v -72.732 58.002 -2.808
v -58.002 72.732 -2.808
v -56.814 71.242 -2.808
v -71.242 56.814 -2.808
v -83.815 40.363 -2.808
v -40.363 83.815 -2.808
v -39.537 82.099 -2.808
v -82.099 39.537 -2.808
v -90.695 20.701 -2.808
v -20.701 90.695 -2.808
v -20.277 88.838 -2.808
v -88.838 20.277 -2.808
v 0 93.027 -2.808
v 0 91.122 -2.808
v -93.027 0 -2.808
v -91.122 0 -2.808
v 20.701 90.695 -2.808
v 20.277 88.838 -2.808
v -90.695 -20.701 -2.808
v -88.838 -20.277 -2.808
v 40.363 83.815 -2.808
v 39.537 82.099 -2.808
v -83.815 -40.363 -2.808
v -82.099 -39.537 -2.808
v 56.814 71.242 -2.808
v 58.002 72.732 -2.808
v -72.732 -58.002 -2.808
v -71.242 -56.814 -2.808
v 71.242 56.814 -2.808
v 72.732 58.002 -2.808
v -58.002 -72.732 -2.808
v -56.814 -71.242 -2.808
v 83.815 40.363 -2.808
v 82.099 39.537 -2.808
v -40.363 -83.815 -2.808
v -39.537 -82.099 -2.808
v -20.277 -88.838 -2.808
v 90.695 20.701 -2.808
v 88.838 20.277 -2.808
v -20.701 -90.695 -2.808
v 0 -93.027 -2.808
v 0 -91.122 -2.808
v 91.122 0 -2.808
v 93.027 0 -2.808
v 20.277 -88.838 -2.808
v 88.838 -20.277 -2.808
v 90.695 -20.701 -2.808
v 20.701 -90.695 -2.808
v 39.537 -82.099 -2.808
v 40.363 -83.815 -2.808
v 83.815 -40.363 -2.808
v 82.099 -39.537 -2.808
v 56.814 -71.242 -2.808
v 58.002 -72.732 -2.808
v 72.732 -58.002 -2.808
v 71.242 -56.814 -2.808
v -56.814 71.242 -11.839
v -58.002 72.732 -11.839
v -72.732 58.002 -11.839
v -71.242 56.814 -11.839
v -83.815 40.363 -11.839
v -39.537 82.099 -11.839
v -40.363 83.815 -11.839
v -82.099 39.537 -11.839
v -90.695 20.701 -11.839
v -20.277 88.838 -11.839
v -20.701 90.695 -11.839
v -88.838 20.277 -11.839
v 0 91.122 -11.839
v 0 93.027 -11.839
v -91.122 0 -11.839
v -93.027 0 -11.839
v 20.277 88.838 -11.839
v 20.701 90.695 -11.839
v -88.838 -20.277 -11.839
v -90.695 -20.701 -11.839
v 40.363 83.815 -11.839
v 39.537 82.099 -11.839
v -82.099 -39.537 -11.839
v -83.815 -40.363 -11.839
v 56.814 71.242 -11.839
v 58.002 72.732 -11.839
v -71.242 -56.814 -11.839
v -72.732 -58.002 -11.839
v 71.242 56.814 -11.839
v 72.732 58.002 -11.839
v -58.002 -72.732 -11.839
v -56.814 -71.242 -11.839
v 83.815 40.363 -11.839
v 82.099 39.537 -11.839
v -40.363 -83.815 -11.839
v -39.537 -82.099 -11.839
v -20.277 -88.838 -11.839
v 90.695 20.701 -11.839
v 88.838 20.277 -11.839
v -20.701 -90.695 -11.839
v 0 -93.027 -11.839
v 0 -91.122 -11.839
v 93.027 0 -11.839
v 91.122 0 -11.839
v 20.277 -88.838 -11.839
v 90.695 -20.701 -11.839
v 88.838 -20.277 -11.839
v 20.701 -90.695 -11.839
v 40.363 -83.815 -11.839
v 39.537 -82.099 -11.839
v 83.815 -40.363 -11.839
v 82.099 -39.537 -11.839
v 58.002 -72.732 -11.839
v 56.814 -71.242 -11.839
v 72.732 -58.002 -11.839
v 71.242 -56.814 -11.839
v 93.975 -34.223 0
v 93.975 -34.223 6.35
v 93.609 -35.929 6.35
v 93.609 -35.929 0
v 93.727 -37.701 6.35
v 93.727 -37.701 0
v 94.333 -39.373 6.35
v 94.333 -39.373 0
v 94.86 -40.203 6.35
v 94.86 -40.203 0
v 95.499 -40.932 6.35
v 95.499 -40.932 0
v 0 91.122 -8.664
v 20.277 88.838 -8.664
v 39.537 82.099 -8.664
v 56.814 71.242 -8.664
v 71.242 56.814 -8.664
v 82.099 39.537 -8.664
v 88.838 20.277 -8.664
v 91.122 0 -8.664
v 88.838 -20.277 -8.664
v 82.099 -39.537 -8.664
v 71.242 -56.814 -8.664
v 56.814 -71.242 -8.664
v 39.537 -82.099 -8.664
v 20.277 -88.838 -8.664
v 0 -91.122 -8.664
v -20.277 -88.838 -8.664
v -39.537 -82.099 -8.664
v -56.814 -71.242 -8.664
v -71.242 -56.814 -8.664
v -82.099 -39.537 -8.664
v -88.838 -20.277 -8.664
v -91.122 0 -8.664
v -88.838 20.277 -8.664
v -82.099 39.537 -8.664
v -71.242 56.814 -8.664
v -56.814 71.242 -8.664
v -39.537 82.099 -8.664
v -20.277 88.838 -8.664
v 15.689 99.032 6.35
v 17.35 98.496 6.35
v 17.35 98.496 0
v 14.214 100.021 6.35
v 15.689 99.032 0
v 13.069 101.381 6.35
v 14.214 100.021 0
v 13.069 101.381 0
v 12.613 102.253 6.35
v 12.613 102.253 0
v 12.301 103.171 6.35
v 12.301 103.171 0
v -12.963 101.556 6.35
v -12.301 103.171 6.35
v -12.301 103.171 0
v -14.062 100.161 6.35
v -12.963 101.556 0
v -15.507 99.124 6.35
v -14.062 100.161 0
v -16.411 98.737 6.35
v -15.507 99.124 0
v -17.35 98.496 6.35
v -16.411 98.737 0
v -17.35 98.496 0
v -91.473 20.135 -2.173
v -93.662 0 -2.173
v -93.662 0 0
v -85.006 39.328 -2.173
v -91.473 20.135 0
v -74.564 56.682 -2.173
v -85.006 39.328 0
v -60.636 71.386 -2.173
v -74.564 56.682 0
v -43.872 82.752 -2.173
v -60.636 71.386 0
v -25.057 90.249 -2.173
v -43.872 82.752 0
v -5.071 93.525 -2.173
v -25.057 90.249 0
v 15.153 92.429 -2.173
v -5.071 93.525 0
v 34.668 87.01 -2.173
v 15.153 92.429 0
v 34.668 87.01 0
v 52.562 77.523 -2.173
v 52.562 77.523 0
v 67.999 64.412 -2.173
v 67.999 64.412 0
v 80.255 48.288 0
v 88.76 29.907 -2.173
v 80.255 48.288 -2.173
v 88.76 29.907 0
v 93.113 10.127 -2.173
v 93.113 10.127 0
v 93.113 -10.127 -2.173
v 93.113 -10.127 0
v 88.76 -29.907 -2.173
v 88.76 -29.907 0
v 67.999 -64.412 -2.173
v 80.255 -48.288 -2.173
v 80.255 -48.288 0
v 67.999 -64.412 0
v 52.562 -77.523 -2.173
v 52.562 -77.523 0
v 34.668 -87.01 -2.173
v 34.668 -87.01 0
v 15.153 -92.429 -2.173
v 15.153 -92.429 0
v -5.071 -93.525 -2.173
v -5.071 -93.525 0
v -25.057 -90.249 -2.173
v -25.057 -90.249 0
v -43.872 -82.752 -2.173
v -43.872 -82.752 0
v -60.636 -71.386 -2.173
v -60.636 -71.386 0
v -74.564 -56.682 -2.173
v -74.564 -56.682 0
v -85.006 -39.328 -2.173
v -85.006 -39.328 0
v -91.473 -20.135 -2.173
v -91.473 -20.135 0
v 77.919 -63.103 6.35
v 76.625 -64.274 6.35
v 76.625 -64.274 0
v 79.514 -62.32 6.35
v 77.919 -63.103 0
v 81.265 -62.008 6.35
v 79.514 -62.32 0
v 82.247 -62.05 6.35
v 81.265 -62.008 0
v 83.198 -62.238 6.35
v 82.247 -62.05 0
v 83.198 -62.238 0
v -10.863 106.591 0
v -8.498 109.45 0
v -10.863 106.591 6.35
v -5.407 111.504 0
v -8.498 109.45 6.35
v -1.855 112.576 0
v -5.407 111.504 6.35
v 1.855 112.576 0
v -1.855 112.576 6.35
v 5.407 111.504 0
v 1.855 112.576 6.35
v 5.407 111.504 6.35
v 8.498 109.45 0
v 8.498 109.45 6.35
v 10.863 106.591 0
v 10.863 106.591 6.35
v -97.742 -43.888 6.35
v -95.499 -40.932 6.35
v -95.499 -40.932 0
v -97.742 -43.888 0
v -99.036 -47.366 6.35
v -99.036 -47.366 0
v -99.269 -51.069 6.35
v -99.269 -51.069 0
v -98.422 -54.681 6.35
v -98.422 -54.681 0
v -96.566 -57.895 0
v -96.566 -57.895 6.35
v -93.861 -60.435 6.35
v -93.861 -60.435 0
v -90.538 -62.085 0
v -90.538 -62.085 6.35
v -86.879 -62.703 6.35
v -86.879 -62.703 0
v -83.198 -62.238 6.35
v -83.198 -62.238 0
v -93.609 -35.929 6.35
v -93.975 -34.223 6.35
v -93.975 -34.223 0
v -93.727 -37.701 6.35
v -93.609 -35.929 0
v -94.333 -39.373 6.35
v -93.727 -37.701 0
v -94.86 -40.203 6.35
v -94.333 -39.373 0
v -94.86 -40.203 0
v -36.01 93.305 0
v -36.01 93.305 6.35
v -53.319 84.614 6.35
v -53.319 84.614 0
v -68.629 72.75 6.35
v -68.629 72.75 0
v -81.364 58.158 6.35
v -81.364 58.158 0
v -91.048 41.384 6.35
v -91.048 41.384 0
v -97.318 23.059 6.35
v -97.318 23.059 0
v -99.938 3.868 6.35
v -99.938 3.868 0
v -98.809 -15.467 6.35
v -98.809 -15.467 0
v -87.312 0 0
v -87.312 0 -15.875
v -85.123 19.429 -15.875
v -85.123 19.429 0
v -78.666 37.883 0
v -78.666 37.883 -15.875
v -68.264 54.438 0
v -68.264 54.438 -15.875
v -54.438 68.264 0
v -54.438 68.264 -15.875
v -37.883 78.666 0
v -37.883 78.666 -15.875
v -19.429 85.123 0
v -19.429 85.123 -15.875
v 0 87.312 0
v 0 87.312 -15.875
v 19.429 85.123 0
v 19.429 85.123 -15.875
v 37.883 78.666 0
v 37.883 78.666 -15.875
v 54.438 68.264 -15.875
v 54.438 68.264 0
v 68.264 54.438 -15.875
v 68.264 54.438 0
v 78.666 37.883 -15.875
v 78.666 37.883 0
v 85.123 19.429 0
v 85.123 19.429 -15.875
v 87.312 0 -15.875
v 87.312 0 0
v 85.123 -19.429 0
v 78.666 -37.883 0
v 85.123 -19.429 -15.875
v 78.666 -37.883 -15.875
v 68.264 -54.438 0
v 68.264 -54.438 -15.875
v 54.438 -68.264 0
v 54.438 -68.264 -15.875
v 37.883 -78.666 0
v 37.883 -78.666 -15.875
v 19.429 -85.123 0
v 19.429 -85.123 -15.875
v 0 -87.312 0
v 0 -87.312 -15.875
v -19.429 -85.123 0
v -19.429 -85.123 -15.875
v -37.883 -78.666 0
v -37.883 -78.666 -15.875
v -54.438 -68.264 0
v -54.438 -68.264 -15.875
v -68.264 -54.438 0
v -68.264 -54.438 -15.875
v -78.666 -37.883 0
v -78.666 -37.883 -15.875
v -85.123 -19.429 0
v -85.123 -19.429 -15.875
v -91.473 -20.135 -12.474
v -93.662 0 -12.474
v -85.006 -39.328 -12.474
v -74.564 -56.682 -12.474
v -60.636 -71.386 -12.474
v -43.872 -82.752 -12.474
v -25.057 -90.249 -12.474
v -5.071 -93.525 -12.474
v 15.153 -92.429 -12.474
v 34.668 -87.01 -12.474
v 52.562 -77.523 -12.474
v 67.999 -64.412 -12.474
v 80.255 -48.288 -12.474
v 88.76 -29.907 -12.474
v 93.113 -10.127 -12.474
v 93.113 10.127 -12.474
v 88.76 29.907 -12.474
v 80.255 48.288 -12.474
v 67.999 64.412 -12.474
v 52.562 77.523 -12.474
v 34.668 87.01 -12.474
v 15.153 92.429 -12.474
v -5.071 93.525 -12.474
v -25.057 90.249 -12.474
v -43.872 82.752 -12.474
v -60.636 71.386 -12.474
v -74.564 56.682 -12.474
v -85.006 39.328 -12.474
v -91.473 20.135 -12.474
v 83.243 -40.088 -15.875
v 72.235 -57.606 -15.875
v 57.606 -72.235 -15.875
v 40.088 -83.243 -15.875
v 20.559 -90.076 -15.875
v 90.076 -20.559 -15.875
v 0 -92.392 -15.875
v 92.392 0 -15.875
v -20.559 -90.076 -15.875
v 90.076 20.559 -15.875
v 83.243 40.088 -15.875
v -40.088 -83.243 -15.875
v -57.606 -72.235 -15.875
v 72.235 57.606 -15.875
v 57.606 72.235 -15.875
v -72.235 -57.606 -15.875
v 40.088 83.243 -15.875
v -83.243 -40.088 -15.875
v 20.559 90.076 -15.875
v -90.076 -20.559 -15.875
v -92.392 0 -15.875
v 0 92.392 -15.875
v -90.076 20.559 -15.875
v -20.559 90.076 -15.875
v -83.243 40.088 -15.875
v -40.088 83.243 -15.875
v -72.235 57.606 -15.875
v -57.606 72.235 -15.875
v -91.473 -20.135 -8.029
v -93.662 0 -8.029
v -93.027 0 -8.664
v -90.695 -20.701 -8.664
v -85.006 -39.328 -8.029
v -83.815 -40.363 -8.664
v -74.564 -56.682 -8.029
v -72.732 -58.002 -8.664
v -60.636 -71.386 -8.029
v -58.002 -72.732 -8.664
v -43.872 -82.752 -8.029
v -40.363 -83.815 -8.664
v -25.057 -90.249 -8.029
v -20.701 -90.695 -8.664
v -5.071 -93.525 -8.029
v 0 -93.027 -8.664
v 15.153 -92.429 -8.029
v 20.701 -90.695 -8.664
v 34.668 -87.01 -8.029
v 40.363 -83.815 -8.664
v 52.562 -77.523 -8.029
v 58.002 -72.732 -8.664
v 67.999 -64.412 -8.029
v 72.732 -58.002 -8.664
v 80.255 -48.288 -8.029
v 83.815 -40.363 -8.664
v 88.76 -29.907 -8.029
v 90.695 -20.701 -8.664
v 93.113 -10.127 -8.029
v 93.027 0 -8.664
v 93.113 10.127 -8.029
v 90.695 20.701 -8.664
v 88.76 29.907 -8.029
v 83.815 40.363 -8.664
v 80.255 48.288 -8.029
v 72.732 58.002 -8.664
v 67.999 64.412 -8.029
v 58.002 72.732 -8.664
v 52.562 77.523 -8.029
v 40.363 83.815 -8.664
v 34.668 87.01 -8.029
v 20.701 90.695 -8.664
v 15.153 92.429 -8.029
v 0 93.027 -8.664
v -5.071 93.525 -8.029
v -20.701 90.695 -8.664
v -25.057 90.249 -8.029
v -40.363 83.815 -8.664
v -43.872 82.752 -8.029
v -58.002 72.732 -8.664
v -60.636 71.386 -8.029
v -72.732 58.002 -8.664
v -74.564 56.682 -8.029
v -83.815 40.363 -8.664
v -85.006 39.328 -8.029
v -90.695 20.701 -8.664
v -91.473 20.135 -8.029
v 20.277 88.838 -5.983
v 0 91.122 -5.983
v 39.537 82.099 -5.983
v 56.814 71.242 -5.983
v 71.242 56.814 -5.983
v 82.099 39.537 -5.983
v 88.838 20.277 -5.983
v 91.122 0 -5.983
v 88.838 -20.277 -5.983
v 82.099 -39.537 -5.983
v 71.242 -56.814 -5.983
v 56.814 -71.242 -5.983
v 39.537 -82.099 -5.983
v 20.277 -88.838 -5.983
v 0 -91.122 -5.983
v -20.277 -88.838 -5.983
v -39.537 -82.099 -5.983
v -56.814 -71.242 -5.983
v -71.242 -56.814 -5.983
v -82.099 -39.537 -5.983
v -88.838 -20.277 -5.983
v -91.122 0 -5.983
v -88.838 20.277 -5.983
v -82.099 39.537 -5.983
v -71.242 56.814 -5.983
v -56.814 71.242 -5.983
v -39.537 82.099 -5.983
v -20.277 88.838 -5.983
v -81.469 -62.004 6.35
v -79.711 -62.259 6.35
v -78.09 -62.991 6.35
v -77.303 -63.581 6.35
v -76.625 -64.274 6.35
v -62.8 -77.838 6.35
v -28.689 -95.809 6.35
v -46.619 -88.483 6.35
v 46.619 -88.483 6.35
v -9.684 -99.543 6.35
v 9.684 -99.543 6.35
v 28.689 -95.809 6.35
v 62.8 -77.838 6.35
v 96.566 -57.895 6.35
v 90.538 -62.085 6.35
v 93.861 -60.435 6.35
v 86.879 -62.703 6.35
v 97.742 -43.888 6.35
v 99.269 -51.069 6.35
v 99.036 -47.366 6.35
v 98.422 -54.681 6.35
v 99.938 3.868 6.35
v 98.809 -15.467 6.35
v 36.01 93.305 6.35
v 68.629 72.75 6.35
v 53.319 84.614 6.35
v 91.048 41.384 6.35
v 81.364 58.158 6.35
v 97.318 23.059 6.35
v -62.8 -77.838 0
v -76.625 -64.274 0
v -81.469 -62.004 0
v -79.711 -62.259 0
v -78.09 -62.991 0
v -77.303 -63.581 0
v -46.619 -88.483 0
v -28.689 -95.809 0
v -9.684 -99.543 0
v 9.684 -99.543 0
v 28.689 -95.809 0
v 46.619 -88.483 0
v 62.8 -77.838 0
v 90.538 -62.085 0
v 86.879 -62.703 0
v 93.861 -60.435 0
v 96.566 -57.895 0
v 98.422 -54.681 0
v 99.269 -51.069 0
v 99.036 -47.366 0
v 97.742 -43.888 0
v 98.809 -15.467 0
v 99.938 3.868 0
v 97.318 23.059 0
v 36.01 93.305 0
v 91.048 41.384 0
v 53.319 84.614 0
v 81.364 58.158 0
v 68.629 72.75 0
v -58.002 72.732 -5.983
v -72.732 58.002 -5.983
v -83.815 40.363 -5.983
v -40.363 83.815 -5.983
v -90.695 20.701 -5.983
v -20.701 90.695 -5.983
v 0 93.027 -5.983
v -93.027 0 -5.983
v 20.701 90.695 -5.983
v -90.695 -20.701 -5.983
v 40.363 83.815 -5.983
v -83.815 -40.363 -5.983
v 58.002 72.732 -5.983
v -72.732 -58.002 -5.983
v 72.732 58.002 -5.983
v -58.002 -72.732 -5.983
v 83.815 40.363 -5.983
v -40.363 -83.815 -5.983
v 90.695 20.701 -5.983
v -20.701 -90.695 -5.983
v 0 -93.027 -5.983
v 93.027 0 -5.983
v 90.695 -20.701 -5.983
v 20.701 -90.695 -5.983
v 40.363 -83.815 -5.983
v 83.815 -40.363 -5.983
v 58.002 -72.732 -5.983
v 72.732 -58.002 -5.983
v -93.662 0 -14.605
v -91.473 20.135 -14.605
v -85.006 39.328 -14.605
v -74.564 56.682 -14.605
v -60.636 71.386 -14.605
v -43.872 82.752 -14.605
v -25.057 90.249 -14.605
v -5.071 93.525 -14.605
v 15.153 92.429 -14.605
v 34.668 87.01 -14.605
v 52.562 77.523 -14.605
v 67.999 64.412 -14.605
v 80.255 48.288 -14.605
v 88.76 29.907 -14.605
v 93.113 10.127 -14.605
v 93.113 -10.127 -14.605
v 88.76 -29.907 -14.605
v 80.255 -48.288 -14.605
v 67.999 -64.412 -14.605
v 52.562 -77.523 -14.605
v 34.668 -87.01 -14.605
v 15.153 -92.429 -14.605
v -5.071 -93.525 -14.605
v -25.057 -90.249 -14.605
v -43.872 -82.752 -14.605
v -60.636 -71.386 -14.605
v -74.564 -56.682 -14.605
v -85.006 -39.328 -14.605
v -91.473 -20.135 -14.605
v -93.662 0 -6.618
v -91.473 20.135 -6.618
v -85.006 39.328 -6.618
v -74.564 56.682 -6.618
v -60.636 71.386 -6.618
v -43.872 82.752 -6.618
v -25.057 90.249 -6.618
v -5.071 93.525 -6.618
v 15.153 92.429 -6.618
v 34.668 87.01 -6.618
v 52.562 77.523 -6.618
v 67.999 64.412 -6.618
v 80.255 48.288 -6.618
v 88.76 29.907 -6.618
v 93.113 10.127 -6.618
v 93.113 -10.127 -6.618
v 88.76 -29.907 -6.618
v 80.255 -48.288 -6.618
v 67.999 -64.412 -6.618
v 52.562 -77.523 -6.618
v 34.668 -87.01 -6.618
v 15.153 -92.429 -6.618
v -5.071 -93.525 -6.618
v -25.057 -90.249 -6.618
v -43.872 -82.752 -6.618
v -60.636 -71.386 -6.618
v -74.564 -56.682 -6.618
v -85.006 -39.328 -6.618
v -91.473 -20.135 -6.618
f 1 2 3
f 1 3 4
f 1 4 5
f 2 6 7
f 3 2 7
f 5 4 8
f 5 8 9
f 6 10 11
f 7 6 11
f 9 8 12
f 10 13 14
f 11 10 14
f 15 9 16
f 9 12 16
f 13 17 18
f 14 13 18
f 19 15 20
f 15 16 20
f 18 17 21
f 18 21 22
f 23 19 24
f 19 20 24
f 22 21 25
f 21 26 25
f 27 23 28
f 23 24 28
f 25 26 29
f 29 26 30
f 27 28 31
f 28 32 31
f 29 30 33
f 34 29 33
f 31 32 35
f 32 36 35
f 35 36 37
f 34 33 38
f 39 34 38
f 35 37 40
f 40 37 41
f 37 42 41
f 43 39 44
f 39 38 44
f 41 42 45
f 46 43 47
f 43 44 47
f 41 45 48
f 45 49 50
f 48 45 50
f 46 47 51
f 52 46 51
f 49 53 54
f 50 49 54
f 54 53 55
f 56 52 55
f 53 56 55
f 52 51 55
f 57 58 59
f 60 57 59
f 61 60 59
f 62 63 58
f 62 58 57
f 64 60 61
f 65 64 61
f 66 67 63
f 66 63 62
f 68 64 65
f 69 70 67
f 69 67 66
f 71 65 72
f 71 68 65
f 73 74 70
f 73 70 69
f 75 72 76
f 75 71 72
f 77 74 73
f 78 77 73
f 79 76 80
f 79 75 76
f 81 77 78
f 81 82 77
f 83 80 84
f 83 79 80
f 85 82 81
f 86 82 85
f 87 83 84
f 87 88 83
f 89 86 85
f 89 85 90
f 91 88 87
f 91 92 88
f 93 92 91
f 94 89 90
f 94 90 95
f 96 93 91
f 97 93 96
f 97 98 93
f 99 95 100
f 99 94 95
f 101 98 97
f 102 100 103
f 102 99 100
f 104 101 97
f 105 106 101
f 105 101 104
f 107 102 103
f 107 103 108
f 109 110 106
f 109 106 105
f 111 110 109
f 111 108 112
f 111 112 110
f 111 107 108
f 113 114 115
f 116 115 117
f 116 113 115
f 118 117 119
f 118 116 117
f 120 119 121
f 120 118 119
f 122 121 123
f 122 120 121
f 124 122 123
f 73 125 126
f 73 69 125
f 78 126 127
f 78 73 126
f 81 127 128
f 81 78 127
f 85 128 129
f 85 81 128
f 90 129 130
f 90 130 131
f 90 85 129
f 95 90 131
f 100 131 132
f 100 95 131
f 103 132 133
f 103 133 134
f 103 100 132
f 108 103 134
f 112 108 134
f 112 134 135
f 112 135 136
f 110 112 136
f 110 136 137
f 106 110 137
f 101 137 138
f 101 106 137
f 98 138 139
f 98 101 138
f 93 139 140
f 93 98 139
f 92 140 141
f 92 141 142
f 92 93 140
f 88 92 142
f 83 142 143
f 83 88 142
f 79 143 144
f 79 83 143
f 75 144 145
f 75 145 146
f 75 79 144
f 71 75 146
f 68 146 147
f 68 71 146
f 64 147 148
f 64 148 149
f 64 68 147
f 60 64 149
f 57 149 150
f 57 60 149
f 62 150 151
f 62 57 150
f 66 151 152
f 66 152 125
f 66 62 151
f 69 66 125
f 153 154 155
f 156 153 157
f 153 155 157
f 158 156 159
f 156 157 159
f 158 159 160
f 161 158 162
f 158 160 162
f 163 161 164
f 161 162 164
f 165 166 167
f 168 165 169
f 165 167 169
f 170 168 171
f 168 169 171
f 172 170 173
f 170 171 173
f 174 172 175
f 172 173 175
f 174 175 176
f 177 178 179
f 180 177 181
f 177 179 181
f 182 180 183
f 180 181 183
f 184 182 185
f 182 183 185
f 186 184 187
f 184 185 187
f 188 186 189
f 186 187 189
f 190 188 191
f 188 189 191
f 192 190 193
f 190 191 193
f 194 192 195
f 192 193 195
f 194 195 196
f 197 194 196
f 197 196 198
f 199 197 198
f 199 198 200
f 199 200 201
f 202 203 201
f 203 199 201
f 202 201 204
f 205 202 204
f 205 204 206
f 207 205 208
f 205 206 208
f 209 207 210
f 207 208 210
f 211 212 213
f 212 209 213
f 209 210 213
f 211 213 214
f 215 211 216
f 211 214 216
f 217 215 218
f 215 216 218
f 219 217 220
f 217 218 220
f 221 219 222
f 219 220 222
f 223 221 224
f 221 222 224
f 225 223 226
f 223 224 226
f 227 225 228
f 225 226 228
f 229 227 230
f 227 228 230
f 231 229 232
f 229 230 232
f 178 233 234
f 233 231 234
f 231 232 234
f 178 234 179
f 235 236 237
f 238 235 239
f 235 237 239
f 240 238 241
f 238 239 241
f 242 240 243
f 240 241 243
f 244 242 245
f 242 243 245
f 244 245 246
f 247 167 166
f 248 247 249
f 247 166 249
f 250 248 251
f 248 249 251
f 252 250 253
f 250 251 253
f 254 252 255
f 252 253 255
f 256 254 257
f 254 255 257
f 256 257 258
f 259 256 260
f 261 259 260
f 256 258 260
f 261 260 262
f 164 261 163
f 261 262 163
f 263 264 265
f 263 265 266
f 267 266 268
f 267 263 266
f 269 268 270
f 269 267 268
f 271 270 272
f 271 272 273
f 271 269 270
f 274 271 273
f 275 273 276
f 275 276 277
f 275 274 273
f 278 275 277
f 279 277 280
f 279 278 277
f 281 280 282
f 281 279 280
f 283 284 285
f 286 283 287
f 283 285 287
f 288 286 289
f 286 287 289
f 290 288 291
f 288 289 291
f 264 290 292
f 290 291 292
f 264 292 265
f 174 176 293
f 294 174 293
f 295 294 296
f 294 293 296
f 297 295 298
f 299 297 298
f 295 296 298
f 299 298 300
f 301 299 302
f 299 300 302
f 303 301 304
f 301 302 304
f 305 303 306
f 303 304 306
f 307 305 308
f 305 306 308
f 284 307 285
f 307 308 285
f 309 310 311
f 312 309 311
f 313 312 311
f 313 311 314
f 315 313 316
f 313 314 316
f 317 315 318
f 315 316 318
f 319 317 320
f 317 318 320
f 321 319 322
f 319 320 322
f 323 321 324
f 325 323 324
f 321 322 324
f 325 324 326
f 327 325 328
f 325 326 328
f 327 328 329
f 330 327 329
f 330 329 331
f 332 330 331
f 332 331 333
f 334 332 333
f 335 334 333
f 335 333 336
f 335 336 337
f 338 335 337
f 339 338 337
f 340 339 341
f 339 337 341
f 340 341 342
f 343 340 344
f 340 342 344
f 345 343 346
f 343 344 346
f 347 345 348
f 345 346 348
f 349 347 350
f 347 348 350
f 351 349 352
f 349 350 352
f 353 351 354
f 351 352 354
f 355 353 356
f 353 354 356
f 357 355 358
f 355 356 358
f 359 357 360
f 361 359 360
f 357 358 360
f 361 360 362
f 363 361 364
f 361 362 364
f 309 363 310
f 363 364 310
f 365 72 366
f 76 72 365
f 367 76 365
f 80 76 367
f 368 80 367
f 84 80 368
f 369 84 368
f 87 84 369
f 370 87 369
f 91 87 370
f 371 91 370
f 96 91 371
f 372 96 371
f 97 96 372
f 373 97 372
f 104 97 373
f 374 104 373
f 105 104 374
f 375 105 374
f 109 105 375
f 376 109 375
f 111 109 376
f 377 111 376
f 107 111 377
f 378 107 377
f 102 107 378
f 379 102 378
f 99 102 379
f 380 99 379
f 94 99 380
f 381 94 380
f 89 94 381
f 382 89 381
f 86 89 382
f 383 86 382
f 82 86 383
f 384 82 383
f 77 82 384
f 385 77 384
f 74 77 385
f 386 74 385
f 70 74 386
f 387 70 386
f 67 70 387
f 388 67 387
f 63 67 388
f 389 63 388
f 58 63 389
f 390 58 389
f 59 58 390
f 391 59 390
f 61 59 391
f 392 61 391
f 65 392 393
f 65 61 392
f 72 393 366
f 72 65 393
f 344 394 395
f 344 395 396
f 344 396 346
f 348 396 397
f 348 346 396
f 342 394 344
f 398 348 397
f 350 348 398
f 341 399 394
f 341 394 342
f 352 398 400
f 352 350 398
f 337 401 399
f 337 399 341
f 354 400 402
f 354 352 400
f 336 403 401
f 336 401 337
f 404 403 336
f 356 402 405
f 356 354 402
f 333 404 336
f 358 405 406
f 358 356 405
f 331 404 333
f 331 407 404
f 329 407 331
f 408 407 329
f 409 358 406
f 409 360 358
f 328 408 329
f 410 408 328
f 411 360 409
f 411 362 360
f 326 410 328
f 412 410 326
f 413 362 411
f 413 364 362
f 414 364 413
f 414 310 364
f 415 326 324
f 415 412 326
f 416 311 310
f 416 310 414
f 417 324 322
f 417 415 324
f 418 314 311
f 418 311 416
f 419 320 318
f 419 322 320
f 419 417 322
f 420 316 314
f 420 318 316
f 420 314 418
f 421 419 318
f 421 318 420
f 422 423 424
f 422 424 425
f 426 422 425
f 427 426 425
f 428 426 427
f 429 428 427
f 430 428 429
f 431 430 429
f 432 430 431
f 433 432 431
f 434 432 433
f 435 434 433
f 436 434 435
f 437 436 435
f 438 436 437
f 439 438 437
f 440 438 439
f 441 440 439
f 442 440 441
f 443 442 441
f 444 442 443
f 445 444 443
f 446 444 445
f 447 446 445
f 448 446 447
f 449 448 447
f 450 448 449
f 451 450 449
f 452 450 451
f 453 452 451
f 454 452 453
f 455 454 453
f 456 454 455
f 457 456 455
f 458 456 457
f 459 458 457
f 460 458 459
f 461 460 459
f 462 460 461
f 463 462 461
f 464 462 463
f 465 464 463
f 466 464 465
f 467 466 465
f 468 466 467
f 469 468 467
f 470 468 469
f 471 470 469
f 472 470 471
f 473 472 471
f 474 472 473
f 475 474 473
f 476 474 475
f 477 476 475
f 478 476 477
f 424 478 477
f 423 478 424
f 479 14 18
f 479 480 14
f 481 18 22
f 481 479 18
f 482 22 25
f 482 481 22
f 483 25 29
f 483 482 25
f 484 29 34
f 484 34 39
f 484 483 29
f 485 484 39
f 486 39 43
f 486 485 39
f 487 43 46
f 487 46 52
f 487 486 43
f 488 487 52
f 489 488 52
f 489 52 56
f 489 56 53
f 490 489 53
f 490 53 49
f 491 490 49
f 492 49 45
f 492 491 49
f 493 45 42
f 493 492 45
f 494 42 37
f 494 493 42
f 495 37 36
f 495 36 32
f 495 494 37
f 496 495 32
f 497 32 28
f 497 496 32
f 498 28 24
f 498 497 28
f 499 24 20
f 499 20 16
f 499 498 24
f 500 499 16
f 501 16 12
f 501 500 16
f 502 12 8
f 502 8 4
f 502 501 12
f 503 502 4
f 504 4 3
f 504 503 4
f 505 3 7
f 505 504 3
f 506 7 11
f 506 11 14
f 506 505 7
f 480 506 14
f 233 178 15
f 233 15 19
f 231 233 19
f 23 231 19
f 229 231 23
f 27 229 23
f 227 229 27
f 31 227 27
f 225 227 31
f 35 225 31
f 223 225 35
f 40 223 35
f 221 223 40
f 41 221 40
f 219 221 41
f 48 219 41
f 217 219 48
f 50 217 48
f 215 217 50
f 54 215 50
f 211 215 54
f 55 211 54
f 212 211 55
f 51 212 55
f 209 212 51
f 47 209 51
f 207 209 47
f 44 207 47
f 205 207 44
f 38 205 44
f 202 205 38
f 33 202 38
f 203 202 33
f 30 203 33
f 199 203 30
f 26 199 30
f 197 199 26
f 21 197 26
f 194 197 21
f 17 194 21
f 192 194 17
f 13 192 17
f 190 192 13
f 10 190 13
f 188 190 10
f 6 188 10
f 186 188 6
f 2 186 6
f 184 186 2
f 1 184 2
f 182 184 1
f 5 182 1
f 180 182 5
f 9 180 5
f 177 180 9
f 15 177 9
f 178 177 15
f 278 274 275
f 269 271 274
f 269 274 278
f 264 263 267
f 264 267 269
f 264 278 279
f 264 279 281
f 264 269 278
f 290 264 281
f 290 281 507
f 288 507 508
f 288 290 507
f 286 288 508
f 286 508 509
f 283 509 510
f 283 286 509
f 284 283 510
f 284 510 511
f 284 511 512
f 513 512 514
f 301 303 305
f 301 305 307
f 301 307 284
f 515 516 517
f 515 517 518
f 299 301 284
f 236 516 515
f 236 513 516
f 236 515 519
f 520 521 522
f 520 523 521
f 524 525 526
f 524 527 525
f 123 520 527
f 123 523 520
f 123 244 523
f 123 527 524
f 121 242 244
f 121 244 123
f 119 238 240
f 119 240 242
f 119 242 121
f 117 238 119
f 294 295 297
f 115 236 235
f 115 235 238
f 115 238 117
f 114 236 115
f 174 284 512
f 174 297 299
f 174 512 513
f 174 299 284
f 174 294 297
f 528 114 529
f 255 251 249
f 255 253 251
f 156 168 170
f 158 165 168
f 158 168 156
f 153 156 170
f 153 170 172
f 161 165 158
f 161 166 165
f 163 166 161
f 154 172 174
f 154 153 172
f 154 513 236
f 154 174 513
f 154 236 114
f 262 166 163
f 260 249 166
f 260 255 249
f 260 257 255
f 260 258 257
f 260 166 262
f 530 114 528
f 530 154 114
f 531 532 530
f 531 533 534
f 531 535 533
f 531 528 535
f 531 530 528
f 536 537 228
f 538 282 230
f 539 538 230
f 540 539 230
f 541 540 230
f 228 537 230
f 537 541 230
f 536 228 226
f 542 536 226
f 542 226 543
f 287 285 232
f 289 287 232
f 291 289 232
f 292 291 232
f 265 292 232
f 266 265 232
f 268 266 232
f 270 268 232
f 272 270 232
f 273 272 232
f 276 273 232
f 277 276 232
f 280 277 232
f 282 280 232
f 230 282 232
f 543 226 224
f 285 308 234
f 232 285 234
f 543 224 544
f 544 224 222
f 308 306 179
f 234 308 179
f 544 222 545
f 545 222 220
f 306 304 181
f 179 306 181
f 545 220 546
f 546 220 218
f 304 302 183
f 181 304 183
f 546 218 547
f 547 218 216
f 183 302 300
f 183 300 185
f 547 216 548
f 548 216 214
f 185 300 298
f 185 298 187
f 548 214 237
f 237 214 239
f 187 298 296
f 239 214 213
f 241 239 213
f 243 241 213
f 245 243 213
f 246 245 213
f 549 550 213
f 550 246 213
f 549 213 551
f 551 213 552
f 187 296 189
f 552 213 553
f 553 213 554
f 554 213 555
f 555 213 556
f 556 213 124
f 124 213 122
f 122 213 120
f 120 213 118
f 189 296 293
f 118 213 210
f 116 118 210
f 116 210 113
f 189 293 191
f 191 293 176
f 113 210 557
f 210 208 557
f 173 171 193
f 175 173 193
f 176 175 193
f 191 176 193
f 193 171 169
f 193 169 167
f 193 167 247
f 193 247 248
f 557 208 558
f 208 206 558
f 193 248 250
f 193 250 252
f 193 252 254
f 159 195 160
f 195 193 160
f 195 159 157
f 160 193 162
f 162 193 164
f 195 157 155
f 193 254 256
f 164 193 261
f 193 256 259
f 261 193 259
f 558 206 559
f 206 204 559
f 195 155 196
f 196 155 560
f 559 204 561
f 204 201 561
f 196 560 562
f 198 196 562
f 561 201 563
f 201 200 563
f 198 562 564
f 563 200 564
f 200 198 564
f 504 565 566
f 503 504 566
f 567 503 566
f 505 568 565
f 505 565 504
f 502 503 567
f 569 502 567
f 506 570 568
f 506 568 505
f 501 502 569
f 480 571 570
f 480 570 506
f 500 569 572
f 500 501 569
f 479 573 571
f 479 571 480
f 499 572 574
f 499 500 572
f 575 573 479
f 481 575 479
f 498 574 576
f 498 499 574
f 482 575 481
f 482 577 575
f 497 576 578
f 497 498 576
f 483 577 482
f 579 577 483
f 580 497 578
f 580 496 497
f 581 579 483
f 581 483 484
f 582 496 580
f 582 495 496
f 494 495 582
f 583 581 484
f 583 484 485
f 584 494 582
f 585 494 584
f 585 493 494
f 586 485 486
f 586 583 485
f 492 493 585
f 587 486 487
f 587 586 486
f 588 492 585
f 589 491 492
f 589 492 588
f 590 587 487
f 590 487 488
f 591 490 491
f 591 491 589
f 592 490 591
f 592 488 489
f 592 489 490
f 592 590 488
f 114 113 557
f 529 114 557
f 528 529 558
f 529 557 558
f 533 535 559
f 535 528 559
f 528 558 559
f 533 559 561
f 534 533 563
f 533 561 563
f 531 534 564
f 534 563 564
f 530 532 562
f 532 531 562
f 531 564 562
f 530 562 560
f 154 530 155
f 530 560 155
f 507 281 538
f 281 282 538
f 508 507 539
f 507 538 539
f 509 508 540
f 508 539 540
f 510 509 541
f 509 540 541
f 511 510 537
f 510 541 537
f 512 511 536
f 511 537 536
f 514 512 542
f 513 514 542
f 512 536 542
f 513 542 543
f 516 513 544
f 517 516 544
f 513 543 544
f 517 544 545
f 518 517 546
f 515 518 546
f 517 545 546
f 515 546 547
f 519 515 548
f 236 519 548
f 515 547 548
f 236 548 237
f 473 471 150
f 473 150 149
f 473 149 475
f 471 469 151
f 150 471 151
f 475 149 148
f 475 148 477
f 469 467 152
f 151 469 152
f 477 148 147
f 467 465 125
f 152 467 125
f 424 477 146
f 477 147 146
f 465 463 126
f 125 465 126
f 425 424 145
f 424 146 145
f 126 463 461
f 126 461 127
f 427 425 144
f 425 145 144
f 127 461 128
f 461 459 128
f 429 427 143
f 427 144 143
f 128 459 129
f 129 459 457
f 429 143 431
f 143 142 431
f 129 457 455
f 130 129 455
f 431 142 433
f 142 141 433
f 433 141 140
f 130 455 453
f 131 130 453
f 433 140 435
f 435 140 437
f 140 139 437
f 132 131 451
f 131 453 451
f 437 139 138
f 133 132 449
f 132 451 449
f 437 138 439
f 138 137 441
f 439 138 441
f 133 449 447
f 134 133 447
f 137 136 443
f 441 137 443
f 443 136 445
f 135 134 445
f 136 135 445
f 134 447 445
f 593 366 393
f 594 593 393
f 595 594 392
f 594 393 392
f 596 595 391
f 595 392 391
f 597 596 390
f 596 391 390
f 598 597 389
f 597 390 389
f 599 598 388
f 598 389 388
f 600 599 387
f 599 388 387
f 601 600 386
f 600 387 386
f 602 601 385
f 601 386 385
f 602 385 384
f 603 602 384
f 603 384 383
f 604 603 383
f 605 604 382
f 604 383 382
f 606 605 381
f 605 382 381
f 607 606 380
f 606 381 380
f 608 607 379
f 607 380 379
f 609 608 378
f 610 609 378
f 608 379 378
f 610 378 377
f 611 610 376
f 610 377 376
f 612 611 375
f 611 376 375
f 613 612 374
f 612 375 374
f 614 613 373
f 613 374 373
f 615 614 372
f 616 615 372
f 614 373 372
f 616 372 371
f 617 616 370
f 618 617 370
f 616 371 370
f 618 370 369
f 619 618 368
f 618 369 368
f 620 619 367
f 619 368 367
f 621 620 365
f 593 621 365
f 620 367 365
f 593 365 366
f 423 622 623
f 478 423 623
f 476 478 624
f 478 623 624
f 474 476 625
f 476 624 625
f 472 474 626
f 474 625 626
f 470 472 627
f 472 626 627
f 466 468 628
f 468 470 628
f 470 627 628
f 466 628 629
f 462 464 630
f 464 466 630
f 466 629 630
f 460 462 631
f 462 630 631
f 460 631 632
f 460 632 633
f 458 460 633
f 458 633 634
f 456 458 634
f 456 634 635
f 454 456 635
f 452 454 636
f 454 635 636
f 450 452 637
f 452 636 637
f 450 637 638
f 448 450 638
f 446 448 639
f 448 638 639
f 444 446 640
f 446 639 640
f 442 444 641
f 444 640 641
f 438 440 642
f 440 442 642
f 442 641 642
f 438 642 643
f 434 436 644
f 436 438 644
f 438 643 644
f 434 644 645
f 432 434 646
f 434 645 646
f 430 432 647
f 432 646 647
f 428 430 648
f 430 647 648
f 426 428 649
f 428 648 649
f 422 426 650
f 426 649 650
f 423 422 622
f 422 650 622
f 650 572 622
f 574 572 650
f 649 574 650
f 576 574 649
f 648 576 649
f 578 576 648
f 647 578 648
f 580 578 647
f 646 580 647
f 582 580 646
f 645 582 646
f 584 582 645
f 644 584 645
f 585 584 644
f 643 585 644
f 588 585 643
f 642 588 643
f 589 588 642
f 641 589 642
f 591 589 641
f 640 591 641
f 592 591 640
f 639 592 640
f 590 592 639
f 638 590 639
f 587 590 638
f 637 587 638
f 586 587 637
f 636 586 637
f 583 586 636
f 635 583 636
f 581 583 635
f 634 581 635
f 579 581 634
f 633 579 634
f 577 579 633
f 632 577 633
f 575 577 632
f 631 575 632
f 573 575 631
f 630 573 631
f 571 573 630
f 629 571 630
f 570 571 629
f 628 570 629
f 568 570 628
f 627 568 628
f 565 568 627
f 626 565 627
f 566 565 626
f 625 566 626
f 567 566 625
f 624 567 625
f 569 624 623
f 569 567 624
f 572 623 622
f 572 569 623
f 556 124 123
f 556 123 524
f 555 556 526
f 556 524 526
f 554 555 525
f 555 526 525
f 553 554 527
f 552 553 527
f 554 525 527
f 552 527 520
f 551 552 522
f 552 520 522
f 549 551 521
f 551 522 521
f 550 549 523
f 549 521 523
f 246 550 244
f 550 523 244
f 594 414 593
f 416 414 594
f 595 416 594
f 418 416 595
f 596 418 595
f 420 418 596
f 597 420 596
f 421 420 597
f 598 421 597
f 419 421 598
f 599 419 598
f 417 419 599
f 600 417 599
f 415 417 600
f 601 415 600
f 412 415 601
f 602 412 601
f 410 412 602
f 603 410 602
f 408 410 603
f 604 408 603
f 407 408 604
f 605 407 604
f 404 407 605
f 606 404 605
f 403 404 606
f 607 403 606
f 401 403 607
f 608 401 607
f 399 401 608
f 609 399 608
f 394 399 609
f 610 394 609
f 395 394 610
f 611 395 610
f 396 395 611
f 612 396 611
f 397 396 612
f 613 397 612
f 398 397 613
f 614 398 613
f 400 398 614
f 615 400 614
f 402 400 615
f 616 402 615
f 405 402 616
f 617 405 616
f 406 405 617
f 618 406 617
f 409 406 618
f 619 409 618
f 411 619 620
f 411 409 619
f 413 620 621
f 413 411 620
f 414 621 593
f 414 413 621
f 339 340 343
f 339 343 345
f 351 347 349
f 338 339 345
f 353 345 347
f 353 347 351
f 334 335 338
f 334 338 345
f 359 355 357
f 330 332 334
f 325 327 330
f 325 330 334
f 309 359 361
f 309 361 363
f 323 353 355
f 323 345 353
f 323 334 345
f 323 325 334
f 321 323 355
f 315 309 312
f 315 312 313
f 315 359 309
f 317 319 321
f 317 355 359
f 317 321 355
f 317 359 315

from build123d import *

# Parameters (mm, degrees)
SKETCH1_R          = 100.0125
EXTRUDE1_DEPTH     = 6.35
SKETCH2_R          = 93.6625
EXTRUDE2_DEPTH     = 15.875
SKETCH3_R          = 87.3125
CUT_EXTRUDE1_DEPTH = 15.875
SKETCH4_W          = 3.175
SKETCH4_H          = 2.54
CHAMFER1_SIZE      = 1.27
EXTRUDE3_DEPTH     = 6.35
CHAMFER2_SIZE      = 0.635
FILLET1_R          = 6.35


with BuildPart() as part:
    # Sketch1 → Extrude1 (new body)
    with BuildSketch(Plane.XY):
        Circle(SKETCH1_R)
    extrude(amount=EXTRUDE1_DEPTH)

    # Sketch2 → Extrude2 (add)
    with BuildSketch(Plane(origin=(0, 0, 0), x_dir=(-1, 0, 0), z_dir=(0, 0, -1))):
        Circle(SKETCH2_R)
    extrude(amount=EXTRUDE2_DEPTH)

    # Sketch3 → Cut-Extrude1 (cut)
    with BuildSketch(Plane(origin=(0, 0, -15.875), x_dir=(-1, 0, 0), z_dir=(0, 0, -1))):
        Circle(SKETCH3_R)
    extrude(amount=-CUT_EXTRUDE1_DEPTH, mode=Mode.SUBTRACT)

    # Sketch4 → Cut-Revolve1 (revolve, cut)
    with BuildSketch(Plane(origin=(0, 0, 0), x_dir=(0, 0, -1), z_dir=(1, 0, 0))):
        with Locations((4.395911794, 92.3925)):
            Rectangle(SKETCH4_W, SKETCH4_H)
        with Locations((10.251990741, 92.3925)):
            Rectangle(SKETCH4_W, SKETCH4_H)
    revolve(axis=Axis((0, 0, 0), (0, 0, -1)), mode=Mode.SUBTRACT)

    # Chamfer1
    chamfer1_edges = [part.edges().sort_by_distance(p)[0] for p in [
        (93.6625, 0, -15.875),
    ]]
    chamfer(chamfer1_edges, length=CHAMFER1_SIZE)

    # Sketch8 → Extrude3 (add)
    with BuildSketch(Plane.XY.offset(6.35)):
        with BuildLine():
            ThreePointArc((-12.674375762, 99.206150794), (0, 112.7125), (12.674375762, 99.206150794))
            ThreePointArc((12.674375762, 99.206150794), (0, 100.0125), (-12.674375762, 99.206150794))
        make_face()
        with BuildLine():
            ThreePointArc((92.25223468, -38.62674401), (97.611888324, -56.35625), (79.577858918, -60.579406784))
            ThreePointArc((79.577858918, -60.579406784), (86.613365696, -50.00625), (92.25223468, -38.62674401))
        make_face()
        with BuildLine():
            ThreePointArc((-92.25223468, -38.62674401), (-97.611888324, -56.35625), (-79.577858918, -60.579406784))
            ThreePointArc((-79.577858918, -60.579406784), (-86.613365696, -50.00625), (-92.25223468, -38.62674401))
        make_face()
    extrude(amount=-EXTRUDE3_DEPTH)

    # Chamfer2
    chamfer2_edges = [part.edges().sort_by_distance(p)[0] for p in [
        (93.6625, 0, -2.808411794),
        (93.6625, 0, -5.983411794),
        (93.6625, 0, -8.664490741),
        (93.6625, 0, -11.839490741),
    ]]
    chamfer(chamfer2_edges, length=CHAMFER2_SIZE)

    # Fillet1
    fillet1_edges = [part.edges().sort_by_distance(p)[0] for p in [
        (12.674375762, 99.206150794, 3.175),
        (-12.674375762, 99.206150794, 3.175),
        (79.577858918, -60.579406784, 3.175),
        (92.25223468, -38.62674401, 3.175),
        (-92.25223468, -38.62674401, 3.175),
        (-79.577858918, -60.579406784, 3.175),
    ]]
    fillet(fillet1_edges, radius=FILLET1_R)


solid = part.part
